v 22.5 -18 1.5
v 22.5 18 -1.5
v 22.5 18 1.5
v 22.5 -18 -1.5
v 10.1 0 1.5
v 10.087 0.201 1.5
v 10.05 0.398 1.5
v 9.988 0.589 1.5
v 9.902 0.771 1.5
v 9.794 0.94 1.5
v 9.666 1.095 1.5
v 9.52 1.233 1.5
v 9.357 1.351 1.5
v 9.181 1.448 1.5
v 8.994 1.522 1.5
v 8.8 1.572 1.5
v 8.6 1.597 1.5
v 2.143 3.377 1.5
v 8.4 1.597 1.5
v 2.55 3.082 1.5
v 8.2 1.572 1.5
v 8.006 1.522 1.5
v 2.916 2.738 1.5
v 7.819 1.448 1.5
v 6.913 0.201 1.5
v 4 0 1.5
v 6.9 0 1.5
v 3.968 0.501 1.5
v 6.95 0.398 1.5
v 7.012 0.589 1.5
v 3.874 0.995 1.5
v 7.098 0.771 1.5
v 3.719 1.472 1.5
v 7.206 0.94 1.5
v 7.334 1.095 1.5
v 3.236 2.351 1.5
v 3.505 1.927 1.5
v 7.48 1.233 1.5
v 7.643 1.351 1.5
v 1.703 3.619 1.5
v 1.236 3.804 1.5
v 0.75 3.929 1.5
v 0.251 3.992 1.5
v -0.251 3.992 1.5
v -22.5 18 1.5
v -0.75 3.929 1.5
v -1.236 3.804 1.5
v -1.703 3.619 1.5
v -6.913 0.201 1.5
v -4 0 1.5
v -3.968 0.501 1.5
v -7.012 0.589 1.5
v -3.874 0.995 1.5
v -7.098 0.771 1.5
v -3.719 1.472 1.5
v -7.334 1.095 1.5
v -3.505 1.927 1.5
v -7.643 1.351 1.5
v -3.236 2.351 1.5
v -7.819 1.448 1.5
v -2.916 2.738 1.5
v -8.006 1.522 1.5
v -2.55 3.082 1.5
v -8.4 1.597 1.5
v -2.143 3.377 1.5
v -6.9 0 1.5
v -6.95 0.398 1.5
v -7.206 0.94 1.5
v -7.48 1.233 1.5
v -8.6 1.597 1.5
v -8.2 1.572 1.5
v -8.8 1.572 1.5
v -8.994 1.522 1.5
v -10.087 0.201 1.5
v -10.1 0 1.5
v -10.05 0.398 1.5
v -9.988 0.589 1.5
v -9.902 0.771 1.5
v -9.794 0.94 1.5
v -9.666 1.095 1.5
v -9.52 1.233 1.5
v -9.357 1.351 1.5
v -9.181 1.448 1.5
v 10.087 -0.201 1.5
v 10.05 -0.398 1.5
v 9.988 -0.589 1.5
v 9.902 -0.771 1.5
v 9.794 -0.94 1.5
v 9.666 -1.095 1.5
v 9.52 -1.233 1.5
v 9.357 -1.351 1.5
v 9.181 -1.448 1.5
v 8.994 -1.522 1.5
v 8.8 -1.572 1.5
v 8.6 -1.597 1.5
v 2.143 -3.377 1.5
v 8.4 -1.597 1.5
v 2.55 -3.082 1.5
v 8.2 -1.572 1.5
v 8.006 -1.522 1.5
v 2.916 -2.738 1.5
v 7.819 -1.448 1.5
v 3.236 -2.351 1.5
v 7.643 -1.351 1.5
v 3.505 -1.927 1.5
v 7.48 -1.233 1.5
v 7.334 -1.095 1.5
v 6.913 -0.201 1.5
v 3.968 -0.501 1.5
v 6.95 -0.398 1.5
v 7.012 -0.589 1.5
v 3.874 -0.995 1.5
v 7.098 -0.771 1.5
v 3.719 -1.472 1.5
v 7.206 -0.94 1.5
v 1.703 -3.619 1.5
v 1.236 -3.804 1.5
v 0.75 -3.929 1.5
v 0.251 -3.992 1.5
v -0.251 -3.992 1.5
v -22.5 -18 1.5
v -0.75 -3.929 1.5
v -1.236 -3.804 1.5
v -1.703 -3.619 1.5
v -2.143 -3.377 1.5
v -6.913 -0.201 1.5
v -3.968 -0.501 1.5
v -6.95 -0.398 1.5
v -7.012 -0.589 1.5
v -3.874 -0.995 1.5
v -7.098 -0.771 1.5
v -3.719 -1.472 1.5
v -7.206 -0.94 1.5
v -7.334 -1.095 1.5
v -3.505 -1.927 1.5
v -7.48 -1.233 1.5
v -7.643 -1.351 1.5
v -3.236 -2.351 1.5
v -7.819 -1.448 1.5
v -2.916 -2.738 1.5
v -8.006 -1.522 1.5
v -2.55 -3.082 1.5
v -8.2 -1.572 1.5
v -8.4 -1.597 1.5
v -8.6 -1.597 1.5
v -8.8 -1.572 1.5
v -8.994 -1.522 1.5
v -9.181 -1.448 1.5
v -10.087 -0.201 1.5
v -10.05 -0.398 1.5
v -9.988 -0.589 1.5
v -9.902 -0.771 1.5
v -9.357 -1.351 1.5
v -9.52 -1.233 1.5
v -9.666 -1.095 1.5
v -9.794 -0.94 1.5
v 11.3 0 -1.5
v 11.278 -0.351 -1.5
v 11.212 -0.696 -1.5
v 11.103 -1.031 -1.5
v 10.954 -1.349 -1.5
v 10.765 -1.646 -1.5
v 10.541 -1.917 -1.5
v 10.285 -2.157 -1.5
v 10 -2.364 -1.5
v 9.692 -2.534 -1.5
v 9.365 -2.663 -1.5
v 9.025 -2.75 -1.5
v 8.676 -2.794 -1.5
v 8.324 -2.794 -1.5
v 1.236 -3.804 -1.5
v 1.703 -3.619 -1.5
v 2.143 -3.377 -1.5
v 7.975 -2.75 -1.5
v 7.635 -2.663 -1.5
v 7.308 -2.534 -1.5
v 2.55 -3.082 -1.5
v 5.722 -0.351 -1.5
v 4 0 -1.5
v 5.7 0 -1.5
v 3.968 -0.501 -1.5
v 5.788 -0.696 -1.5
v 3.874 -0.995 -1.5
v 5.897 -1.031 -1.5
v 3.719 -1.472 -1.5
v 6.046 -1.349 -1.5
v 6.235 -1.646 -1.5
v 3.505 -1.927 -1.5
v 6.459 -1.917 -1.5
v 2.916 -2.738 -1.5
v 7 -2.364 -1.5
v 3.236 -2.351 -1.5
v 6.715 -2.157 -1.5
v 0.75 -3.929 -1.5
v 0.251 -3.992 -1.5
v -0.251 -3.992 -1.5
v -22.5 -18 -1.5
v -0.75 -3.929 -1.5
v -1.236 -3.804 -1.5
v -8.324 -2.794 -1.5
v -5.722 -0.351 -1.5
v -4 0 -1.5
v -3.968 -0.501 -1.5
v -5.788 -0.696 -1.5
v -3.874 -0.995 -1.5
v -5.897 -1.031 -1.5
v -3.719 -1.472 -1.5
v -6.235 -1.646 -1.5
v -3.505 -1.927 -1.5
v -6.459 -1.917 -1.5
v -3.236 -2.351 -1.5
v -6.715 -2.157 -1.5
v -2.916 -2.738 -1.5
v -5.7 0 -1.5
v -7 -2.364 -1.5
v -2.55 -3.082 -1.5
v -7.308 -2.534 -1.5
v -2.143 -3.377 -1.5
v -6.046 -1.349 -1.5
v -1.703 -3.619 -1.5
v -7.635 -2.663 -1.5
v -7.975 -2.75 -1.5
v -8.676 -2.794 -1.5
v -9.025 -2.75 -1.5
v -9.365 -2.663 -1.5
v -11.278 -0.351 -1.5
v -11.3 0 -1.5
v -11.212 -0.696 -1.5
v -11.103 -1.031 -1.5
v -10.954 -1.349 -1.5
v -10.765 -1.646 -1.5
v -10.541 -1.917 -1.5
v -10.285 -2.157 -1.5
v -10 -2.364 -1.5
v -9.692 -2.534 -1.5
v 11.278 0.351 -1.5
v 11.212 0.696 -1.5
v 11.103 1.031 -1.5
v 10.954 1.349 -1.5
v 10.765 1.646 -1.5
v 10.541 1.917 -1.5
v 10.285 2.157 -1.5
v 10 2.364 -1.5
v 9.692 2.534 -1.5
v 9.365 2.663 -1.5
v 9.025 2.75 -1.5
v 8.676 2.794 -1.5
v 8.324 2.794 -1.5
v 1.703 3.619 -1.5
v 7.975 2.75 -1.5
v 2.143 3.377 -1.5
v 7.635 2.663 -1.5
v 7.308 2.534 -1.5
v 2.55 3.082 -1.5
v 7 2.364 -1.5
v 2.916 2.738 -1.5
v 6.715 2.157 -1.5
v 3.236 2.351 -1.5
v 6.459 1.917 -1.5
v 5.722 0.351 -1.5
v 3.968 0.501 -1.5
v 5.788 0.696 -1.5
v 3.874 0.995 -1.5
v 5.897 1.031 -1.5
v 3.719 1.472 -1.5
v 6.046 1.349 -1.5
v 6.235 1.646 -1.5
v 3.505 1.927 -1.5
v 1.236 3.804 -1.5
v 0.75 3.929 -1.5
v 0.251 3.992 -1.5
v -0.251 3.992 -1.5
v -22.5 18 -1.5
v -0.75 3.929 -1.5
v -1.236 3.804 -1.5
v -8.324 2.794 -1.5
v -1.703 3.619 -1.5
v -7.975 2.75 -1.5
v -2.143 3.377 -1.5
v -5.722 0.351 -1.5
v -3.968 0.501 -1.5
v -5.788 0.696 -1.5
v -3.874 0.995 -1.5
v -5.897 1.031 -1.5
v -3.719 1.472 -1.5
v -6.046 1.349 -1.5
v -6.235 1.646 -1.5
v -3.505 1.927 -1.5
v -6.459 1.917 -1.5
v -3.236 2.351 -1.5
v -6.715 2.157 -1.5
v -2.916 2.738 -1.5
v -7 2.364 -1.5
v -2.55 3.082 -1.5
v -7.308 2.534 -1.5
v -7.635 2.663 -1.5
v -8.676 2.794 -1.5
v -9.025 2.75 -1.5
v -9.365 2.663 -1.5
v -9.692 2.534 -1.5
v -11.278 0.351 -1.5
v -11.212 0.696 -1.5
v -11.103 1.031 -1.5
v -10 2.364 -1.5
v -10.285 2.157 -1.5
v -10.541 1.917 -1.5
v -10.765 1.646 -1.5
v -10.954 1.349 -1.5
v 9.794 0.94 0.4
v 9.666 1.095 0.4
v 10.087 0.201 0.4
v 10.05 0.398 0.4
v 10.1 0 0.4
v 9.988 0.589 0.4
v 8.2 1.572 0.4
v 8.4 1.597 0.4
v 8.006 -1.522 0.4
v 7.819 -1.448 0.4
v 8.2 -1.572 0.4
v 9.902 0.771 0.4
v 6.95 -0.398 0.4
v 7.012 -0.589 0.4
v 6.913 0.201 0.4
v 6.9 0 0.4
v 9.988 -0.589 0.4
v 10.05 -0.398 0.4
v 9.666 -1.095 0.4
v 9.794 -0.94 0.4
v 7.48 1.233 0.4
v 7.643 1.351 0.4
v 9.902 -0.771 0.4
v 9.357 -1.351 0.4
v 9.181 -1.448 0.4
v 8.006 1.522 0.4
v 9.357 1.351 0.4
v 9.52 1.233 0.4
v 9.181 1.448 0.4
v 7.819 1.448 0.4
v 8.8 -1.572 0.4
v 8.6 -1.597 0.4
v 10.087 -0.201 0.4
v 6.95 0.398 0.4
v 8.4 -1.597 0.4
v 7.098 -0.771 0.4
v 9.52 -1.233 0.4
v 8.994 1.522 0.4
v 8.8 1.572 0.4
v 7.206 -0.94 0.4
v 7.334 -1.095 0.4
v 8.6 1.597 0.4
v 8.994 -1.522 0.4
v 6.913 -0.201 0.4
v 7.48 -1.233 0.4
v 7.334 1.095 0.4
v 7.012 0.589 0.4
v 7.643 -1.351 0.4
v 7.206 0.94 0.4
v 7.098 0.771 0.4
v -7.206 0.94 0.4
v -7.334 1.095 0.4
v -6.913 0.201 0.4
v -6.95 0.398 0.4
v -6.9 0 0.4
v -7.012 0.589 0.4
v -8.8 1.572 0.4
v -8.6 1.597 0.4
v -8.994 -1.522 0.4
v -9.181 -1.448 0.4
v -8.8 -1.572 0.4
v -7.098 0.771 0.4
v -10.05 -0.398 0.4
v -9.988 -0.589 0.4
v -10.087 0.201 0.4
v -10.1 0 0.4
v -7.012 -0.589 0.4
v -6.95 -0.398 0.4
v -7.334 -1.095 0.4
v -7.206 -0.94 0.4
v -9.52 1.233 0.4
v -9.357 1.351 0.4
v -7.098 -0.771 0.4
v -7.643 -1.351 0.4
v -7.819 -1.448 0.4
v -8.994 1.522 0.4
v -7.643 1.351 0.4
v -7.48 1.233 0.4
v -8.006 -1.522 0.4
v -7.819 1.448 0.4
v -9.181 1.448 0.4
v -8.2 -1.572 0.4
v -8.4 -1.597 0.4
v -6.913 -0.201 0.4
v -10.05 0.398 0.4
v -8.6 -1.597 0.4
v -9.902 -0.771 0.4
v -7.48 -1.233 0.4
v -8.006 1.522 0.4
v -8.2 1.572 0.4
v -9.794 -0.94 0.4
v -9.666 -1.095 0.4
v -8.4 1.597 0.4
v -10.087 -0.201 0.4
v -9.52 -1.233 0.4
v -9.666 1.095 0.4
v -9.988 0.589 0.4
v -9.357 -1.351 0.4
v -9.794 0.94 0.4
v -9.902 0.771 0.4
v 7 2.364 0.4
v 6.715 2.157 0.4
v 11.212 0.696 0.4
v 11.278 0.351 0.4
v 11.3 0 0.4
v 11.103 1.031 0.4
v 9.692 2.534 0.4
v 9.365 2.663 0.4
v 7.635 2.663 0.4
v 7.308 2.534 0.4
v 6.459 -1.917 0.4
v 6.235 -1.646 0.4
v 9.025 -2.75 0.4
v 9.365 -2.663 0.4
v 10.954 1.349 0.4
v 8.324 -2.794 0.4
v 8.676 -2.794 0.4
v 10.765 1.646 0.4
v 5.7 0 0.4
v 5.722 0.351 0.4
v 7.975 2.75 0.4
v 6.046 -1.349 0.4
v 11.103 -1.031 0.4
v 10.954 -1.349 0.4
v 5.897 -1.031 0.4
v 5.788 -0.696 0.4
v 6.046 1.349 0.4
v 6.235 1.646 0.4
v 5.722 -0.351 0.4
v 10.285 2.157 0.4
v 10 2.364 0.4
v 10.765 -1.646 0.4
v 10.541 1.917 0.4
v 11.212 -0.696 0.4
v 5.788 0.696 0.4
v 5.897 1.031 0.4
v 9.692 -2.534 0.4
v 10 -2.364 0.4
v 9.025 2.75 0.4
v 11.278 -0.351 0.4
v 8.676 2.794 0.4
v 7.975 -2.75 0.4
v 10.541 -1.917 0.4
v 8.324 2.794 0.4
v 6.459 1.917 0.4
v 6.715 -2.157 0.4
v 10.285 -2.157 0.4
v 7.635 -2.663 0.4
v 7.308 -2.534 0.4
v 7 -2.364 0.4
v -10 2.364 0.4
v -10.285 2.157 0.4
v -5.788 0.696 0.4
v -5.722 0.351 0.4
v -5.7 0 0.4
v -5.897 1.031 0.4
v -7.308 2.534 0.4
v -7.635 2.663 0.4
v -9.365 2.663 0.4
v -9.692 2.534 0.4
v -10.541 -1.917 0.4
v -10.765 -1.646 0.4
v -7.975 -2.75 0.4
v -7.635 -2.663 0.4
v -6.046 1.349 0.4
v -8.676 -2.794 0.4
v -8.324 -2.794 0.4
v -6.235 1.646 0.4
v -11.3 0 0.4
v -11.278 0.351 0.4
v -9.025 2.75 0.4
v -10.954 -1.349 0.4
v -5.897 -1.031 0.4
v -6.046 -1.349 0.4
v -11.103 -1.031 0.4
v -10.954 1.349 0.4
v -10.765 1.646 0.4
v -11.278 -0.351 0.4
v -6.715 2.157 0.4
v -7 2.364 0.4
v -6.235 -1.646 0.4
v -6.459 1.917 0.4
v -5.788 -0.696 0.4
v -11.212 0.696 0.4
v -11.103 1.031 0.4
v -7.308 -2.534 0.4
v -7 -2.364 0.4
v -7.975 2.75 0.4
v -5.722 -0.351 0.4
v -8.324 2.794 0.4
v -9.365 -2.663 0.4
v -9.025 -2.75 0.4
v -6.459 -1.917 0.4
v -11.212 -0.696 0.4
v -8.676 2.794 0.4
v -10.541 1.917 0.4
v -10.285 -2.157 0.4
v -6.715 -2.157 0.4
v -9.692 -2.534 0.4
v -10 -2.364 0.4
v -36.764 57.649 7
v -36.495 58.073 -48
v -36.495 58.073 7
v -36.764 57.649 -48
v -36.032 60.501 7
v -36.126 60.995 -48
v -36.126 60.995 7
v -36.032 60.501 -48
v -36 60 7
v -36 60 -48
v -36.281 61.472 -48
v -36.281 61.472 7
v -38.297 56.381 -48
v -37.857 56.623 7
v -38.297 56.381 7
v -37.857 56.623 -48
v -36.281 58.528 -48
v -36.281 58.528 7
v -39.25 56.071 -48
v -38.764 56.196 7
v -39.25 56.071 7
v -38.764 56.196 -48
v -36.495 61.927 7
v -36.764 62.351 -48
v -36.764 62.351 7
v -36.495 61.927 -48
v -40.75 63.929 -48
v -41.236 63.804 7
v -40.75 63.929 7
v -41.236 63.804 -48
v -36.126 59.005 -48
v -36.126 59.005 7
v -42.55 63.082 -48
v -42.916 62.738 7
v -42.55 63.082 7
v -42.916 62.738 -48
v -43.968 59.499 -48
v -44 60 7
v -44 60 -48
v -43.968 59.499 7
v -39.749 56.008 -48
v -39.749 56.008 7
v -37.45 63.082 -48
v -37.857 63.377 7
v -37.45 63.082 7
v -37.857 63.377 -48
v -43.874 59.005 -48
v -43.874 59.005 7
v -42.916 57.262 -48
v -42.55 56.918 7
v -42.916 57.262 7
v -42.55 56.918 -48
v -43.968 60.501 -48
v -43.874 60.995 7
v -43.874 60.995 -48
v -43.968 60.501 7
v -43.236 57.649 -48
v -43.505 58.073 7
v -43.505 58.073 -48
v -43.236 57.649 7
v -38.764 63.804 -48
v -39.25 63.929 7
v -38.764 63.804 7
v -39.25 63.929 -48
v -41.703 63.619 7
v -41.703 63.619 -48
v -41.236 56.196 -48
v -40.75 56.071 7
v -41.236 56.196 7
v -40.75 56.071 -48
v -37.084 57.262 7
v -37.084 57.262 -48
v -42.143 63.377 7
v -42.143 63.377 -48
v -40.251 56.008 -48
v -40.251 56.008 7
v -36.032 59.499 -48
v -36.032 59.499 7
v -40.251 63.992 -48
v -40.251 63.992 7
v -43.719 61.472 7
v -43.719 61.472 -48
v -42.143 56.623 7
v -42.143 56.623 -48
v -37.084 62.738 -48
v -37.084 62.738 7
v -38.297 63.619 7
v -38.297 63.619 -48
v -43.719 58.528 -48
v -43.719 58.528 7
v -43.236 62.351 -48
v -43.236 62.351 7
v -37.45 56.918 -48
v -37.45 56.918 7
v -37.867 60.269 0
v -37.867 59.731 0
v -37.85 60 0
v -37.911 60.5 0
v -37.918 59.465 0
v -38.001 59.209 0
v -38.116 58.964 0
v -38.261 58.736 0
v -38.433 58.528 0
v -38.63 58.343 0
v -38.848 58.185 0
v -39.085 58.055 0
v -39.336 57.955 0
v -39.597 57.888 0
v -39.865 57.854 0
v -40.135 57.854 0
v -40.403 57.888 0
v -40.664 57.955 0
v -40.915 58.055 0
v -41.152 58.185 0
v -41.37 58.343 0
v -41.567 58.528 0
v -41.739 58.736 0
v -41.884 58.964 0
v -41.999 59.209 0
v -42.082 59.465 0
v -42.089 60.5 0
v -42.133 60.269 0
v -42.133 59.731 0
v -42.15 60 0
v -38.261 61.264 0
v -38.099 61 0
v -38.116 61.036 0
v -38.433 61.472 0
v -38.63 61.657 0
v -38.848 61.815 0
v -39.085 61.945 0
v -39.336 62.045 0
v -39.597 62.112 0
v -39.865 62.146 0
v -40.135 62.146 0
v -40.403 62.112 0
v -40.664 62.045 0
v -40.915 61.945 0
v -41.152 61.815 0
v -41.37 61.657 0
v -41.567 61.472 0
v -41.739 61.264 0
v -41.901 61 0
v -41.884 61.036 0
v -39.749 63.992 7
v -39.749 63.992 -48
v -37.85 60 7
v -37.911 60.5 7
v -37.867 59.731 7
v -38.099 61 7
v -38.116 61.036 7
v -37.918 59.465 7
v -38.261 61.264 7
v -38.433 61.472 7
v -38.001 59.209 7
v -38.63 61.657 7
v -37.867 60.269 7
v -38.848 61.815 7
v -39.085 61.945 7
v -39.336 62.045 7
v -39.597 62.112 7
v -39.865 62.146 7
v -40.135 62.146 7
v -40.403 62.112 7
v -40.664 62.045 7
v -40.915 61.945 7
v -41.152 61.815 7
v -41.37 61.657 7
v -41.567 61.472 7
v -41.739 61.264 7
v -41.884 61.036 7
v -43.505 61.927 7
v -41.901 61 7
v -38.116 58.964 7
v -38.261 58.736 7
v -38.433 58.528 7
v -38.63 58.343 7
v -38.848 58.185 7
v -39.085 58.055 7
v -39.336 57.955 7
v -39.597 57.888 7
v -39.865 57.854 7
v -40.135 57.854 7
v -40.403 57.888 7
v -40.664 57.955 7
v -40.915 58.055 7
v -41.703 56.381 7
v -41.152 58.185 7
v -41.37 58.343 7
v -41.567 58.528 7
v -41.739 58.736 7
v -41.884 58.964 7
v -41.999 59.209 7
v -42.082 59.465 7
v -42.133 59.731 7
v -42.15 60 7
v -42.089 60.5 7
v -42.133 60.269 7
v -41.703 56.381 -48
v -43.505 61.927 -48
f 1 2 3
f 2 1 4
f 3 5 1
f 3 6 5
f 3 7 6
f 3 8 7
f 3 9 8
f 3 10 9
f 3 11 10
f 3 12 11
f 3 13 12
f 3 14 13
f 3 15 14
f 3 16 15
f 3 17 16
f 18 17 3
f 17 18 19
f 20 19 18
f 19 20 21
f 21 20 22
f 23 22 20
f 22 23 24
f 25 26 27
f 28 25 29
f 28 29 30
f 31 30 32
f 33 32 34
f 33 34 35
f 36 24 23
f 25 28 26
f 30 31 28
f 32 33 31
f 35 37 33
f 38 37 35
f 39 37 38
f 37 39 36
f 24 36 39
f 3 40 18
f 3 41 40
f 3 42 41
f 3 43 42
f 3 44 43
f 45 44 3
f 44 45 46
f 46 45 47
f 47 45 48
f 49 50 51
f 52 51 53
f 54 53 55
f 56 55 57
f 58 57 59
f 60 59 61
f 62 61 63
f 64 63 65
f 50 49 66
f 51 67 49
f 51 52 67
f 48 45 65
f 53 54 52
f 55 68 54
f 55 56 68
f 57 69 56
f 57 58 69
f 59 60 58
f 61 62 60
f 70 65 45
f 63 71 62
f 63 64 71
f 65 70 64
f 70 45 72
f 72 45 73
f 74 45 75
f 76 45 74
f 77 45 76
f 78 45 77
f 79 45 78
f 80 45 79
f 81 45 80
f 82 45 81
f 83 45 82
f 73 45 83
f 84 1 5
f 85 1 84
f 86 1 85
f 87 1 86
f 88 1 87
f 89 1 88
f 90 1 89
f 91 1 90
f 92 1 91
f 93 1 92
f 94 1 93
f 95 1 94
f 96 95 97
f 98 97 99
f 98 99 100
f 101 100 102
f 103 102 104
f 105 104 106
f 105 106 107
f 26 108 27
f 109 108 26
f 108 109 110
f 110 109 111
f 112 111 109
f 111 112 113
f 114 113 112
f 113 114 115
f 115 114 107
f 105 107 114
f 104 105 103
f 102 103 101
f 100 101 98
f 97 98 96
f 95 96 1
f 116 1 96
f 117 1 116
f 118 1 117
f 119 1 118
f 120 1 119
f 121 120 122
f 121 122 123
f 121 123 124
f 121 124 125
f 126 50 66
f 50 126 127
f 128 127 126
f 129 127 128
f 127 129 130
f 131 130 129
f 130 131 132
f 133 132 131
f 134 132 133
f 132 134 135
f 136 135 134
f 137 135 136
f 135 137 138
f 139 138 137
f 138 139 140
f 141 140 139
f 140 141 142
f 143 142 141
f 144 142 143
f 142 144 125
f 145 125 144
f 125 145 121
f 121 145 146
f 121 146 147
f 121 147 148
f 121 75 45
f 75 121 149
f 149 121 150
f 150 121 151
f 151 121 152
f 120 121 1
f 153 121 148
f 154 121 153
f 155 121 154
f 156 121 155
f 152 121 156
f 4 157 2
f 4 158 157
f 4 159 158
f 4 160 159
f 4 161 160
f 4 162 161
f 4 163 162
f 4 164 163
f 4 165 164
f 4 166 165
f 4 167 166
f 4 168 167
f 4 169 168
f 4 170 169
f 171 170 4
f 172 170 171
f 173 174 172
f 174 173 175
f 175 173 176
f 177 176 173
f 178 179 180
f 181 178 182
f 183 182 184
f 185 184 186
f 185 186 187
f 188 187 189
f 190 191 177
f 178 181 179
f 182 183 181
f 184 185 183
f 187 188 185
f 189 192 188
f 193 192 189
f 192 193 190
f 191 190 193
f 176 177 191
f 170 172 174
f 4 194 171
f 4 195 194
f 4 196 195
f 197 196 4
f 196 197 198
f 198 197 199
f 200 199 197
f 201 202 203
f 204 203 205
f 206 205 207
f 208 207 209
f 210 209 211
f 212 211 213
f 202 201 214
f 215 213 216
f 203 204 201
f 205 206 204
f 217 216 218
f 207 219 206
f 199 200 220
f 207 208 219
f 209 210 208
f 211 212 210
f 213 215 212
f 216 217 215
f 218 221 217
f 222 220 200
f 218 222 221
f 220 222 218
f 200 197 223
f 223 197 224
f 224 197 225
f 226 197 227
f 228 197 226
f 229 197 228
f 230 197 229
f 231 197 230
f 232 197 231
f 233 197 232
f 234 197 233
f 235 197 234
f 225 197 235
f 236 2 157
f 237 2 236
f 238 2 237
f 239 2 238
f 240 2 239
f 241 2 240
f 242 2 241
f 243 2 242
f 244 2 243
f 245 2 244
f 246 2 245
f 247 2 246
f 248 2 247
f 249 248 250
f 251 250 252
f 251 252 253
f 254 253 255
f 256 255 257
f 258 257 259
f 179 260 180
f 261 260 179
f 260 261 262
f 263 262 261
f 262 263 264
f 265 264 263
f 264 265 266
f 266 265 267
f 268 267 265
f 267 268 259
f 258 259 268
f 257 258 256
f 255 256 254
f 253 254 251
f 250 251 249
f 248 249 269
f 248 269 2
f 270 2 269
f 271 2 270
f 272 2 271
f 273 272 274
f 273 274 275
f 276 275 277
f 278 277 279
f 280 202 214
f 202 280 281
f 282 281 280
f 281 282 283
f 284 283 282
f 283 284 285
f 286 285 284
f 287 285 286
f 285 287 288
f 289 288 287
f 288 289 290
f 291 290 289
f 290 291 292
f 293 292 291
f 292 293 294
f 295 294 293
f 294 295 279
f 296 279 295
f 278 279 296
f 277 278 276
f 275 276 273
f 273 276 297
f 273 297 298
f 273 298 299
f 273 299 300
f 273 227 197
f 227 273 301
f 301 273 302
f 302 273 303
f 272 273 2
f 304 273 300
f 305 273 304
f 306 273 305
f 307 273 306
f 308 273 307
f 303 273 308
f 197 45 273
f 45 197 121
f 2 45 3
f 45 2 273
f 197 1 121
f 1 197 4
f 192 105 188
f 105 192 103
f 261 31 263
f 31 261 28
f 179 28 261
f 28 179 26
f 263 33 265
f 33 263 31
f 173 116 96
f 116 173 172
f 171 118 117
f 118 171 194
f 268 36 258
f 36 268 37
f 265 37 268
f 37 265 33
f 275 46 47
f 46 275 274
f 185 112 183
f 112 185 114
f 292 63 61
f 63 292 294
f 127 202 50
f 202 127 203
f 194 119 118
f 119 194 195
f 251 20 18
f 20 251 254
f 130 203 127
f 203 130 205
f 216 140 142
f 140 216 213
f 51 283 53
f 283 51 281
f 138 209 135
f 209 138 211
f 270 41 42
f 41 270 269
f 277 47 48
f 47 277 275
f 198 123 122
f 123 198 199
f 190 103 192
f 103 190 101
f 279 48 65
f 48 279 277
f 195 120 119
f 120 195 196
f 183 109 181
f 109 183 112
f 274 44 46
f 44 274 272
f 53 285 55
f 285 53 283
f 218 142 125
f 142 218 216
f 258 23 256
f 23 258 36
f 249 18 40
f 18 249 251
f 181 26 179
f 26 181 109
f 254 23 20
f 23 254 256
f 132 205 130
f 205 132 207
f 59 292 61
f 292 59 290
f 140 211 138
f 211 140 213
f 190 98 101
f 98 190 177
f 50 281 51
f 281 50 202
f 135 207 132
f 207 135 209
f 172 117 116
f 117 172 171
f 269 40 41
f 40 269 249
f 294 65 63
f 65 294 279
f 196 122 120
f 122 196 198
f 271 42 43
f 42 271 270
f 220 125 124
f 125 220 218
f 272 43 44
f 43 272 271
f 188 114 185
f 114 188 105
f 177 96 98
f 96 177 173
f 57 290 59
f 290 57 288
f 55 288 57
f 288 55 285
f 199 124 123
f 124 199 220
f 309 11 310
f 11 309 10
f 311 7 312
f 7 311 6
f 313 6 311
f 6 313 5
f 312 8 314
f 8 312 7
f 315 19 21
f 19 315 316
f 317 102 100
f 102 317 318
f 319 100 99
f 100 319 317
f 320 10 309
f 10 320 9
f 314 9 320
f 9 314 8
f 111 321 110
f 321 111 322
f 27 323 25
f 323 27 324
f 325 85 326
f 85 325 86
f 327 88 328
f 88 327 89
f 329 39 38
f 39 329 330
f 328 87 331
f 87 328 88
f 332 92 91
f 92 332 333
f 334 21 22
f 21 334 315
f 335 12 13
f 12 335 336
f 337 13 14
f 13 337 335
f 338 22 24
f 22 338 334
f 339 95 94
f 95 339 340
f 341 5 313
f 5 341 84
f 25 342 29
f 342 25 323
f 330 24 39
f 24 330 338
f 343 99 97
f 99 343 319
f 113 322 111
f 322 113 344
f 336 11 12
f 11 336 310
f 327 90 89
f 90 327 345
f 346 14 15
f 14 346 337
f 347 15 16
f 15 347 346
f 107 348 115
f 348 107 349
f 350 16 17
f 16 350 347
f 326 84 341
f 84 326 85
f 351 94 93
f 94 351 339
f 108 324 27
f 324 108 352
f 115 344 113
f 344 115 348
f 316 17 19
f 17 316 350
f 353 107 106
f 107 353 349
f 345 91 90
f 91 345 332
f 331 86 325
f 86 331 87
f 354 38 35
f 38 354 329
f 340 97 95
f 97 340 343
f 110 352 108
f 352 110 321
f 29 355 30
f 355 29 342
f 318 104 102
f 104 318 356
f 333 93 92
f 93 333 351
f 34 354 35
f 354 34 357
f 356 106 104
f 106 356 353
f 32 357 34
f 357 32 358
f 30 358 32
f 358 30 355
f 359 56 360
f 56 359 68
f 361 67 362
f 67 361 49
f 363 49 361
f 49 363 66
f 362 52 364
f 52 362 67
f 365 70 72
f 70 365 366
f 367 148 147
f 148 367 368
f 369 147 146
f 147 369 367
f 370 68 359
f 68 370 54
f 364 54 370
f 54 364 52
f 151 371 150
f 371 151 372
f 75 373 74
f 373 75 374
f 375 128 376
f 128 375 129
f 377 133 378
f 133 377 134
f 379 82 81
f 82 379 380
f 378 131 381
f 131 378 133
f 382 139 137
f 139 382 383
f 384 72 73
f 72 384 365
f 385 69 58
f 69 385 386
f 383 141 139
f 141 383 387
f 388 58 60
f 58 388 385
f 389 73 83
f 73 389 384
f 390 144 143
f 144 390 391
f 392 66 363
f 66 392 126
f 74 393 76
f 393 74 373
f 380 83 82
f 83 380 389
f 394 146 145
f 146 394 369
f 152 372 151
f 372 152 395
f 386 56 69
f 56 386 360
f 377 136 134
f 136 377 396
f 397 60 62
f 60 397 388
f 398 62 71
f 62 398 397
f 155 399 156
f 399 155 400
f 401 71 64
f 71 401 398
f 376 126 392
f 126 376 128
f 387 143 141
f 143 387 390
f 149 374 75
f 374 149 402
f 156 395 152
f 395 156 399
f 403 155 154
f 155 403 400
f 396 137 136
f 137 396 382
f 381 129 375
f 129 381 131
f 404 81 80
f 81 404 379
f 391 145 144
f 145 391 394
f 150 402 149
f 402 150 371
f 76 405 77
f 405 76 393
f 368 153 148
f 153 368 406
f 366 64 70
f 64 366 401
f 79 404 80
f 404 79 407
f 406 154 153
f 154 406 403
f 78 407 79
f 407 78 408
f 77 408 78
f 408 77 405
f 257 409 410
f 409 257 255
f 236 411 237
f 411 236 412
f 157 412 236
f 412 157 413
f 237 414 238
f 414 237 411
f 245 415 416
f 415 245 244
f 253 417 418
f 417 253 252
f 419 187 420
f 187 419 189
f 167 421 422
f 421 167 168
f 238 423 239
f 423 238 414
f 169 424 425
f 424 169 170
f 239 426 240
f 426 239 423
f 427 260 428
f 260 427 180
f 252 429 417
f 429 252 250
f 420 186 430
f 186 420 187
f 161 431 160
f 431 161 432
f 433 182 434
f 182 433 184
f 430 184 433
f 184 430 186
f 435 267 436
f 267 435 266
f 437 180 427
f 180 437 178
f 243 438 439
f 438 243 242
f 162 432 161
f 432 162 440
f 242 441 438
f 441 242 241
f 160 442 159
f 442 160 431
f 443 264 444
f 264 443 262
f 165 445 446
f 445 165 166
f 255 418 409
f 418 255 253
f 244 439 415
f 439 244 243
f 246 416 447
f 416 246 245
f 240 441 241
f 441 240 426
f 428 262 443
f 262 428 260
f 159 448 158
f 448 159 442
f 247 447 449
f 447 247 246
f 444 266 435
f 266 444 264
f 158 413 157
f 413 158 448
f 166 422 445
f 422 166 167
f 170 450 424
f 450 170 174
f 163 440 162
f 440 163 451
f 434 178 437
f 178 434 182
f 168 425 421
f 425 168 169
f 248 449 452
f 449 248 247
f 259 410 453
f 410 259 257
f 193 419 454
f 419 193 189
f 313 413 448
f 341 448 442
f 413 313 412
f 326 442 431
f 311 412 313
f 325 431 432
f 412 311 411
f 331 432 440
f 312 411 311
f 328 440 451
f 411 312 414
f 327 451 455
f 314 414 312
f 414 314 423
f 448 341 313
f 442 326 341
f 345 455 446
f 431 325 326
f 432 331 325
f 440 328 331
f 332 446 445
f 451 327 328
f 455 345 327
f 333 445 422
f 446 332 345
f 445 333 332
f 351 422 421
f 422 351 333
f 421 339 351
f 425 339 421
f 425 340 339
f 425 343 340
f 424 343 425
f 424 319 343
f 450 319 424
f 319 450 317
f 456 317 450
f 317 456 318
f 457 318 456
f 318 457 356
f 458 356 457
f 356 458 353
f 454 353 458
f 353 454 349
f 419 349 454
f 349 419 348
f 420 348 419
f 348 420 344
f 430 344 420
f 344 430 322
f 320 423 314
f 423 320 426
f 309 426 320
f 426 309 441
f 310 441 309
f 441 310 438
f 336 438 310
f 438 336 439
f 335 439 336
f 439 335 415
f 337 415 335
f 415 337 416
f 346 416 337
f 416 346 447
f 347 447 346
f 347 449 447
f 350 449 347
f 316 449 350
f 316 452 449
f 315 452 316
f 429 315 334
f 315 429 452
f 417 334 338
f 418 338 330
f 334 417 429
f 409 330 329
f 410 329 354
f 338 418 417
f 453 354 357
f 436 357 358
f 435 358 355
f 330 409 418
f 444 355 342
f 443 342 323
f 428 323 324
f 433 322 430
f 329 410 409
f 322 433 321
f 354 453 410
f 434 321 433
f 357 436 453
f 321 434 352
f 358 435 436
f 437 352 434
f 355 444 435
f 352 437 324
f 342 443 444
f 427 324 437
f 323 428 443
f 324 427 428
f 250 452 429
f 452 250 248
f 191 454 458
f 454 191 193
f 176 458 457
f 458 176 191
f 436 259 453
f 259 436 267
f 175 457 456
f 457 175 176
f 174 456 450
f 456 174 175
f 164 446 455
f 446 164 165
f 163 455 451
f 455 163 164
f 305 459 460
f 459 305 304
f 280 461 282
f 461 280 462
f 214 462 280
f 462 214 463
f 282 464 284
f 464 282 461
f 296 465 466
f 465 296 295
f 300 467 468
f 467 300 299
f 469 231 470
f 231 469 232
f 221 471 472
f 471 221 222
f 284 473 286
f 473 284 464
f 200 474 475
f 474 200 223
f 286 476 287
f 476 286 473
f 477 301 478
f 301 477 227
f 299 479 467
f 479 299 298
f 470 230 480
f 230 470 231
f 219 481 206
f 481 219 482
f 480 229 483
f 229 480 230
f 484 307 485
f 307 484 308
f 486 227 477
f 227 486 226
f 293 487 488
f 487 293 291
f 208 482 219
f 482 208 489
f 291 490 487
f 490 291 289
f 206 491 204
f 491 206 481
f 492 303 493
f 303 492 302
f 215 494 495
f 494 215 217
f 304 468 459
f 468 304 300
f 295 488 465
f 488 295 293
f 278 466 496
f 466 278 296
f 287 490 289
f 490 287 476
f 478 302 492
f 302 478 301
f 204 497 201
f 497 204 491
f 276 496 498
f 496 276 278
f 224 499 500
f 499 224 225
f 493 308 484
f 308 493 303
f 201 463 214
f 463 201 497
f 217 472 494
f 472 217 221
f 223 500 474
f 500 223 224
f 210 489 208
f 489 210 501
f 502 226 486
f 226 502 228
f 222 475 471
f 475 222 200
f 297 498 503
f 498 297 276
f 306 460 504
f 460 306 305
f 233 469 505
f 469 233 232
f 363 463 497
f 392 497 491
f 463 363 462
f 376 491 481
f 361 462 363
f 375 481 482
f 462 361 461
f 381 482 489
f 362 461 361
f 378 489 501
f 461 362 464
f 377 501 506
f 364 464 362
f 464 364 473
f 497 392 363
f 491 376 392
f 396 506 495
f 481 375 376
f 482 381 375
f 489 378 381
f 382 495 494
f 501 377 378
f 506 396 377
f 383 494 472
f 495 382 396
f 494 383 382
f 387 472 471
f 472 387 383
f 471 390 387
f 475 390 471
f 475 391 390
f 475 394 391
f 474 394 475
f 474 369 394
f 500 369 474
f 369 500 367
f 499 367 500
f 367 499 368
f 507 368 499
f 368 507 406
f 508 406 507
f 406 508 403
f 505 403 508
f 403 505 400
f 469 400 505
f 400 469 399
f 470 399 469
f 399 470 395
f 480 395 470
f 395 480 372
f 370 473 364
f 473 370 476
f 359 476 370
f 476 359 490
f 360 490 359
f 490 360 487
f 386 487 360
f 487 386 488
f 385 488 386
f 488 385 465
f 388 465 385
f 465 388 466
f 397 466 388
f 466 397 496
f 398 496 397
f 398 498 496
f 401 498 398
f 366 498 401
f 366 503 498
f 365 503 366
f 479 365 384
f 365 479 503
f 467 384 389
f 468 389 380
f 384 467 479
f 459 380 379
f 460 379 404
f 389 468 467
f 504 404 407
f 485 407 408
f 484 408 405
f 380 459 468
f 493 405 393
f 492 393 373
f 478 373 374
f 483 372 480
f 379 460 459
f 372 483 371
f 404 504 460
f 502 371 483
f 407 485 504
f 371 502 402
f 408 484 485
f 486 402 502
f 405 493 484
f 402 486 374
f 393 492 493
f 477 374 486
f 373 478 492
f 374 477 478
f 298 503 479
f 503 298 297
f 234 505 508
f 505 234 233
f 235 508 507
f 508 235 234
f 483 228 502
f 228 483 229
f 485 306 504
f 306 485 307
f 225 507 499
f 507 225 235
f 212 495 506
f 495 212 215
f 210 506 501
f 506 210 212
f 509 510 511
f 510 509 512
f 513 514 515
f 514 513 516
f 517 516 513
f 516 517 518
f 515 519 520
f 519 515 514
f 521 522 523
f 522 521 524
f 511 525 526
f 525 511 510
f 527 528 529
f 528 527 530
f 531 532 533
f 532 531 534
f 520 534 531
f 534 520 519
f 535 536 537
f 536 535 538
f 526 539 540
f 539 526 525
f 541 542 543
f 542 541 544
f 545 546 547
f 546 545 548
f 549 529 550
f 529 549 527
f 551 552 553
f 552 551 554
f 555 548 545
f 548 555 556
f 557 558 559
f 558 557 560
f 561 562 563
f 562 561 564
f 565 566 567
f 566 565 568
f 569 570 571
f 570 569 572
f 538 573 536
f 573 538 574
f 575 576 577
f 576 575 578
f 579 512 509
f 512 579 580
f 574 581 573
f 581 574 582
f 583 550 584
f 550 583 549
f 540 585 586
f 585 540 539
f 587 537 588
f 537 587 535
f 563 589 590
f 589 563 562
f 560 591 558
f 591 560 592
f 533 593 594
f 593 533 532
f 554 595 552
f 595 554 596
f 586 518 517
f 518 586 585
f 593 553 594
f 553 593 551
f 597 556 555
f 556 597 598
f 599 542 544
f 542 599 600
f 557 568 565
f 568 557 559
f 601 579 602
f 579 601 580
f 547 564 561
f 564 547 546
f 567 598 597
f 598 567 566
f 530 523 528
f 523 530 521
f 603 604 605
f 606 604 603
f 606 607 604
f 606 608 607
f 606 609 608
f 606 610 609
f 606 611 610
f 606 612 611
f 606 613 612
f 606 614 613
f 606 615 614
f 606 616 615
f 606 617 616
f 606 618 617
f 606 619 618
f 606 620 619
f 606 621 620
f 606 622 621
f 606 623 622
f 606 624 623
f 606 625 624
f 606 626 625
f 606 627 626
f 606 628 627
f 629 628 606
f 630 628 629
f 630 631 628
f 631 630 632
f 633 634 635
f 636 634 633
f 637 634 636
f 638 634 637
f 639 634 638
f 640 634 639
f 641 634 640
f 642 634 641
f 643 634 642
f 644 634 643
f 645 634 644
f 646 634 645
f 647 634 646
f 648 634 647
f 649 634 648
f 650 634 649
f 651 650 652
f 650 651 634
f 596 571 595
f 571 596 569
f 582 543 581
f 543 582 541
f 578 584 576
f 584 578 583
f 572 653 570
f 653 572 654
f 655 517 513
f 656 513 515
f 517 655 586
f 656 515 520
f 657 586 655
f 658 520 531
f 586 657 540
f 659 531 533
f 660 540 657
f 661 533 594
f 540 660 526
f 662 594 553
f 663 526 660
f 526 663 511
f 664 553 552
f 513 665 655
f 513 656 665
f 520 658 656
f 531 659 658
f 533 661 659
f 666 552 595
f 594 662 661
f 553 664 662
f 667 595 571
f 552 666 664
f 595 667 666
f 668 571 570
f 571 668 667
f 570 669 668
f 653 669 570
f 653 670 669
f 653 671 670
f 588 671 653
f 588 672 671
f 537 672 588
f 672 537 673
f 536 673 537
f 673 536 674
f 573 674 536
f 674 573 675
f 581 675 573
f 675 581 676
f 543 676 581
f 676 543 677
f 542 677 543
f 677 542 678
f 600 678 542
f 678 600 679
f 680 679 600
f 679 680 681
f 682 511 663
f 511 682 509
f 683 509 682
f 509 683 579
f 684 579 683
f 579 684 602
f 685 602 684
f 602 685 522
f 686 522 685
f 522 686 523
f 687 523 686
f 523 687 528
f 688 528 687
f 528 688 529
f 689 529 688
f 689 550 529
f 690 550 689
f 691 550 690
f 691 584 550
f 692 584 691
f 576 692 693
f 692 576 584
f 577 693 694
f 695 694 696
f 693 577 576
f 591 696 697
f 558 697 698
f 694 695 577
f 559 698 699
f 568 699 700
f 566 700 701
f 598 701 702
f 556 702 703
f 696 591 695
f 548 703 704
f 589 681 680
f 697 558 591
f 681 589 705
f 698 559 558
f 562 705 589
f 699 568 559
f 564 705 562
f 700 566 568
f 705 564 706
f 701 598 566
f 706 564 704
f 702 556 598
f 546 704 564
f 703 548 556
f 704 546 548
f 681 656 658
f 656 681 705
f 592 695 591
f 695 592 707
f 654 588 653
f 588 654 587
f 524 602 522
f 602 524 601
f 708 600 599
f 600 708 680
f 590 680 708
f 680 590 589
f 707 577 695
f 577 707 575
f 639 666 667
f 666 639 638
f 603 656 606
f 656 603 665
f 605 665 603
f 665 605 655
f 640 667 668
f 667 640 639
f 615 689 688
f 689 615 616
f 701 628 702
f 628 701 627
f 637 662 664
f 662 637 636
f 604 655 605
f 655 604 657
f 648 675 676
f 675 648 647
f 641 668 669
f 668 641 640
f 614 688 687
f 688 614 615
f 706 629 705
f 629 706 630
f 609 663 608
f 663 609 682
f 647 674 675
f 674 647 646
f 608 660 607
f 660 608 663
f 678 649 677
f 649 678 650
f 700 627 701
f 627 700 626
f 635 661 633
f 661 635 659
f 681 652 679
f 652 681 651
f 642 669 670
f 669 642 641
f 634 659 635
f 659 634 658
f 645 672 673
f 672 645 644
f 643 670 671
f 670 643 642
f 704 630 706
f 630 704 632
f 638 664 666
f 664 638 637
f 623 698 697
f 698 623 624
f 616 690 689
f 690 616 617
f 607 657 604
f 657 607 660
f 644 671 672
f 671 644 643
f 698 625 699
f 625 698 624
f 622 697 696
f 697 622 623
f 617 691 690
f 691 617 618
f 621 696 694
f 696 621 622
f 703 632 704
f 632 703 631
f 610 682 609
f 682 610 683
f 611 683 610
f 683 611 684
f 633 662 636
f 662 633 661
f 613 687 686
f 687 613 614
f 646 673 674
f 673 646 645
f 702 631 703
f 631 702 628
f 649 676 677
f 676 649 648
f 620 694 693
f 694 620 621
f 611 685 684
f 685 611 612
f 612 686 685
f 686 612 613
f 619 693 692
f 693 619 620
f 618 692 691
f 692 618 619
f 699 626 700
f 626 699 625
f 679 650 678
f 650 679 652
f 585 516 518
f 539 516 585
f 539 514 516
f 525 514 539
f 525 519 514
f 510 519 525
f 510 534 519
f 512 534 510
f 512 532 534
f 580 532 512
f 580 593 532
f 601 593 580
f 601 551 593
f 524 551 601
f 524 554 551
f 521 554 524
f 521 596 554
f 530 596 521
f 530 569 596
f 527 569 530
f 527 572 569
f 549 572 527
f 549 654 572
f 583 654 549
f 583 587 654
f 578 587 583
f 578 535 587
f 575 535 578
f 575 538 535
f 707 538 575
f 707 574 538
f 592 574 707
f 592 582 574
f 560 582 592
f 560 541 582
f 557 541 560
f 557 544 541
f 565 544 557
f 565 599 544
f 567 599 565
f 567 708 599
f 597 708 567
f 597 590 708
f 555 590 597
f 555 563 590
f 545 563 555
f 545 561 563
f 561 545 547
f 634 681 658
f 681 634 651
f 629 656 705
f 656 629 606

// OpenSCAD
// file: ../robot_settings.scad
main_box_x = 95.5; // 96
main_box_y = 102;
main_box_z = 74; // 74.5
wall_thickness = 2;

rail_gap = 2;
rail_inset = 7;

rail_thickness = 7;
rail_length = 250;
rail_width = 200;

raspberry_pi_screw_seperation_y = 57;
raspberry_pi_screw_seperation_z = 48;
raspberry_pi_peg_h = 8;

gears_module = 1;
pinion_gear_teeth = 30;
pinion_gear_width = 5;
pinion_gear_bore = 4;

gears_setback_distance = 25;
gear_post_height = 2 * pinion_gear_width + rail_thickness + 8 ;

steering_motor_mount_x = 45;
steering_motor_mount_y = 36;
steering_motor_mount_z = 18;
steering_motor_mount_setback_distance = gears_setback_distance + 16;

dc_motor_housing_minus_encoder_z = 48;
dc_motor_encoder_z = 9.33;
dc_motor_encoder_wheel_d = 13.4;
dc_motor_encoder_wheel_thickness = 5;
dc_motor_encoder_wheel_gap = 3;
dc_motor_encoder_circuit_thickness = 2;
dc_motor_cutout_d = 24.8;
dc_motor_cutout_z = 19.5;

dc_motor_screw_head_z = 2;
dc_motor_screw_head_d = 5.6;
dc_motor_screw_d = 3.2;
dc_motor_screw_offset = 8.5;

dc_motor_axle_ring_z = 3;
dc_motor_axle_ring_d = 7.2;
dc_motor_axle_cutout_d = 4.5;
dc_motor_axle_cutout_z = 10;
dc_motor_axle_notch_cutout = 0.5;
dc_motor_axle_notch_cutout_z = 6;

steering_shaft_z = gear_post_height + dc_motor_axle_ring_z + pinion_gear_width + 15;
steering_shaft_d = 7;
steering_shaft_motor_fitting_d = 9;

lidar_mount_y = 125;
lidar_mount_x = 65;

ball_bearing_height = 7;
ball_bearing_outer_diameter = 22;
ball_bearing_inner_diameter = 8;

pull_bar_radius = 3.3;

rack_module = 1;
rack_length = main_box_x / 2;
rack_height = 10;
rack_width = 10;
rack_teeth = 30;
rack_bore = 3;

// tire hardware
axle_reciever_inner_diameter = 7.75;
axle_reciever_length = 18.8;
axle_notch_length = 7;
axle_notch_cutout = 2.4;
// main file
$fn = 50;
include <../robot_settings.scad>

 module dc_motor_mount(show_steering_shaft = true, show_mount = true) {

if (show_mount) {
    // mount with hole
  difference() {
    cube([
      steering_motor_mount_x, 
      steering_motor_mount_y, 
      dc_motor_axle_ring_z
    ], center = true);
    
    translate([0,0, -dc_motor_axle_ring_z / 2 - 1])
        cylinder(
          h = dc_motor_axle_ring_z + 2, 
          d = ball_bearing_inner_diameter
        );
    
    translate([dc_motor_screw_offset,0, -dc_motor_axle_ring_z / 2 - 1])
      cylinder(
        h = dc_motor_axle_ring_z + 2,
        d = dc_motor_screw_d
      );
    
    translate([-dc_motor_screw_offset, 0, -dc_motor_axle_ring_z / 2 - 1])
    cylinder(
      h = dc_motor_axle_ring_z + 2,
      d = dc_motor_screw_d
    ); 
    
    translate([dc_motor_screw_offset,0,-dc_motor_axle_ring_z / 2 - .1])
    cylinder(
      h = dc_motor_screw_head_z,
      d = dc_motor_screw_head_d
    );
    translate([-dc_motor_screw_offset,0,-dc_motor_axle_ring_z / 2 - .1])
    cylinder(
      h = dc_motor_screw_head_z,
      d = dc_motor_screw_head_d
    );
   }
  }

  if (show_steering_shaft) {
      // motor connection
        // shorten the main shaft
      
    translate([-40,60, -steering_shaft_z]) {
      cylinder(h = steering_shaft_z, d = ball_bearing_inner_diameter);
        
      union()
        
      difference() 
       {
           // so that a 1 mm in diameter larger cap is on top
          translate([0, 0, steering_shaft_z])
            cylinder(h = ball_bearing_height, d = ball_bearing_inner_diameter);
          
         // axle cutout
          translate([0, 0, -dc_motor_axle_cutout_z + steering_shaft_z + ball_bearing_height])
            cylinder(h = dc_motor_axle_cutout_z + .1, d = dc_motor_axle_cutout_d - .2);           
       }
       
       // d brace
       translate([-dc_motor_axle_cutout_d / 2 , dc_motor_axle_notch_cutout, steering_shaft_z])
       cube([dc_motor_axle_cutout_d, dc_motor_axle_notch_cutout, ball_bearing_height]);
    }
  }
}
dc_motor_mount(show_steering_shaft = true);
